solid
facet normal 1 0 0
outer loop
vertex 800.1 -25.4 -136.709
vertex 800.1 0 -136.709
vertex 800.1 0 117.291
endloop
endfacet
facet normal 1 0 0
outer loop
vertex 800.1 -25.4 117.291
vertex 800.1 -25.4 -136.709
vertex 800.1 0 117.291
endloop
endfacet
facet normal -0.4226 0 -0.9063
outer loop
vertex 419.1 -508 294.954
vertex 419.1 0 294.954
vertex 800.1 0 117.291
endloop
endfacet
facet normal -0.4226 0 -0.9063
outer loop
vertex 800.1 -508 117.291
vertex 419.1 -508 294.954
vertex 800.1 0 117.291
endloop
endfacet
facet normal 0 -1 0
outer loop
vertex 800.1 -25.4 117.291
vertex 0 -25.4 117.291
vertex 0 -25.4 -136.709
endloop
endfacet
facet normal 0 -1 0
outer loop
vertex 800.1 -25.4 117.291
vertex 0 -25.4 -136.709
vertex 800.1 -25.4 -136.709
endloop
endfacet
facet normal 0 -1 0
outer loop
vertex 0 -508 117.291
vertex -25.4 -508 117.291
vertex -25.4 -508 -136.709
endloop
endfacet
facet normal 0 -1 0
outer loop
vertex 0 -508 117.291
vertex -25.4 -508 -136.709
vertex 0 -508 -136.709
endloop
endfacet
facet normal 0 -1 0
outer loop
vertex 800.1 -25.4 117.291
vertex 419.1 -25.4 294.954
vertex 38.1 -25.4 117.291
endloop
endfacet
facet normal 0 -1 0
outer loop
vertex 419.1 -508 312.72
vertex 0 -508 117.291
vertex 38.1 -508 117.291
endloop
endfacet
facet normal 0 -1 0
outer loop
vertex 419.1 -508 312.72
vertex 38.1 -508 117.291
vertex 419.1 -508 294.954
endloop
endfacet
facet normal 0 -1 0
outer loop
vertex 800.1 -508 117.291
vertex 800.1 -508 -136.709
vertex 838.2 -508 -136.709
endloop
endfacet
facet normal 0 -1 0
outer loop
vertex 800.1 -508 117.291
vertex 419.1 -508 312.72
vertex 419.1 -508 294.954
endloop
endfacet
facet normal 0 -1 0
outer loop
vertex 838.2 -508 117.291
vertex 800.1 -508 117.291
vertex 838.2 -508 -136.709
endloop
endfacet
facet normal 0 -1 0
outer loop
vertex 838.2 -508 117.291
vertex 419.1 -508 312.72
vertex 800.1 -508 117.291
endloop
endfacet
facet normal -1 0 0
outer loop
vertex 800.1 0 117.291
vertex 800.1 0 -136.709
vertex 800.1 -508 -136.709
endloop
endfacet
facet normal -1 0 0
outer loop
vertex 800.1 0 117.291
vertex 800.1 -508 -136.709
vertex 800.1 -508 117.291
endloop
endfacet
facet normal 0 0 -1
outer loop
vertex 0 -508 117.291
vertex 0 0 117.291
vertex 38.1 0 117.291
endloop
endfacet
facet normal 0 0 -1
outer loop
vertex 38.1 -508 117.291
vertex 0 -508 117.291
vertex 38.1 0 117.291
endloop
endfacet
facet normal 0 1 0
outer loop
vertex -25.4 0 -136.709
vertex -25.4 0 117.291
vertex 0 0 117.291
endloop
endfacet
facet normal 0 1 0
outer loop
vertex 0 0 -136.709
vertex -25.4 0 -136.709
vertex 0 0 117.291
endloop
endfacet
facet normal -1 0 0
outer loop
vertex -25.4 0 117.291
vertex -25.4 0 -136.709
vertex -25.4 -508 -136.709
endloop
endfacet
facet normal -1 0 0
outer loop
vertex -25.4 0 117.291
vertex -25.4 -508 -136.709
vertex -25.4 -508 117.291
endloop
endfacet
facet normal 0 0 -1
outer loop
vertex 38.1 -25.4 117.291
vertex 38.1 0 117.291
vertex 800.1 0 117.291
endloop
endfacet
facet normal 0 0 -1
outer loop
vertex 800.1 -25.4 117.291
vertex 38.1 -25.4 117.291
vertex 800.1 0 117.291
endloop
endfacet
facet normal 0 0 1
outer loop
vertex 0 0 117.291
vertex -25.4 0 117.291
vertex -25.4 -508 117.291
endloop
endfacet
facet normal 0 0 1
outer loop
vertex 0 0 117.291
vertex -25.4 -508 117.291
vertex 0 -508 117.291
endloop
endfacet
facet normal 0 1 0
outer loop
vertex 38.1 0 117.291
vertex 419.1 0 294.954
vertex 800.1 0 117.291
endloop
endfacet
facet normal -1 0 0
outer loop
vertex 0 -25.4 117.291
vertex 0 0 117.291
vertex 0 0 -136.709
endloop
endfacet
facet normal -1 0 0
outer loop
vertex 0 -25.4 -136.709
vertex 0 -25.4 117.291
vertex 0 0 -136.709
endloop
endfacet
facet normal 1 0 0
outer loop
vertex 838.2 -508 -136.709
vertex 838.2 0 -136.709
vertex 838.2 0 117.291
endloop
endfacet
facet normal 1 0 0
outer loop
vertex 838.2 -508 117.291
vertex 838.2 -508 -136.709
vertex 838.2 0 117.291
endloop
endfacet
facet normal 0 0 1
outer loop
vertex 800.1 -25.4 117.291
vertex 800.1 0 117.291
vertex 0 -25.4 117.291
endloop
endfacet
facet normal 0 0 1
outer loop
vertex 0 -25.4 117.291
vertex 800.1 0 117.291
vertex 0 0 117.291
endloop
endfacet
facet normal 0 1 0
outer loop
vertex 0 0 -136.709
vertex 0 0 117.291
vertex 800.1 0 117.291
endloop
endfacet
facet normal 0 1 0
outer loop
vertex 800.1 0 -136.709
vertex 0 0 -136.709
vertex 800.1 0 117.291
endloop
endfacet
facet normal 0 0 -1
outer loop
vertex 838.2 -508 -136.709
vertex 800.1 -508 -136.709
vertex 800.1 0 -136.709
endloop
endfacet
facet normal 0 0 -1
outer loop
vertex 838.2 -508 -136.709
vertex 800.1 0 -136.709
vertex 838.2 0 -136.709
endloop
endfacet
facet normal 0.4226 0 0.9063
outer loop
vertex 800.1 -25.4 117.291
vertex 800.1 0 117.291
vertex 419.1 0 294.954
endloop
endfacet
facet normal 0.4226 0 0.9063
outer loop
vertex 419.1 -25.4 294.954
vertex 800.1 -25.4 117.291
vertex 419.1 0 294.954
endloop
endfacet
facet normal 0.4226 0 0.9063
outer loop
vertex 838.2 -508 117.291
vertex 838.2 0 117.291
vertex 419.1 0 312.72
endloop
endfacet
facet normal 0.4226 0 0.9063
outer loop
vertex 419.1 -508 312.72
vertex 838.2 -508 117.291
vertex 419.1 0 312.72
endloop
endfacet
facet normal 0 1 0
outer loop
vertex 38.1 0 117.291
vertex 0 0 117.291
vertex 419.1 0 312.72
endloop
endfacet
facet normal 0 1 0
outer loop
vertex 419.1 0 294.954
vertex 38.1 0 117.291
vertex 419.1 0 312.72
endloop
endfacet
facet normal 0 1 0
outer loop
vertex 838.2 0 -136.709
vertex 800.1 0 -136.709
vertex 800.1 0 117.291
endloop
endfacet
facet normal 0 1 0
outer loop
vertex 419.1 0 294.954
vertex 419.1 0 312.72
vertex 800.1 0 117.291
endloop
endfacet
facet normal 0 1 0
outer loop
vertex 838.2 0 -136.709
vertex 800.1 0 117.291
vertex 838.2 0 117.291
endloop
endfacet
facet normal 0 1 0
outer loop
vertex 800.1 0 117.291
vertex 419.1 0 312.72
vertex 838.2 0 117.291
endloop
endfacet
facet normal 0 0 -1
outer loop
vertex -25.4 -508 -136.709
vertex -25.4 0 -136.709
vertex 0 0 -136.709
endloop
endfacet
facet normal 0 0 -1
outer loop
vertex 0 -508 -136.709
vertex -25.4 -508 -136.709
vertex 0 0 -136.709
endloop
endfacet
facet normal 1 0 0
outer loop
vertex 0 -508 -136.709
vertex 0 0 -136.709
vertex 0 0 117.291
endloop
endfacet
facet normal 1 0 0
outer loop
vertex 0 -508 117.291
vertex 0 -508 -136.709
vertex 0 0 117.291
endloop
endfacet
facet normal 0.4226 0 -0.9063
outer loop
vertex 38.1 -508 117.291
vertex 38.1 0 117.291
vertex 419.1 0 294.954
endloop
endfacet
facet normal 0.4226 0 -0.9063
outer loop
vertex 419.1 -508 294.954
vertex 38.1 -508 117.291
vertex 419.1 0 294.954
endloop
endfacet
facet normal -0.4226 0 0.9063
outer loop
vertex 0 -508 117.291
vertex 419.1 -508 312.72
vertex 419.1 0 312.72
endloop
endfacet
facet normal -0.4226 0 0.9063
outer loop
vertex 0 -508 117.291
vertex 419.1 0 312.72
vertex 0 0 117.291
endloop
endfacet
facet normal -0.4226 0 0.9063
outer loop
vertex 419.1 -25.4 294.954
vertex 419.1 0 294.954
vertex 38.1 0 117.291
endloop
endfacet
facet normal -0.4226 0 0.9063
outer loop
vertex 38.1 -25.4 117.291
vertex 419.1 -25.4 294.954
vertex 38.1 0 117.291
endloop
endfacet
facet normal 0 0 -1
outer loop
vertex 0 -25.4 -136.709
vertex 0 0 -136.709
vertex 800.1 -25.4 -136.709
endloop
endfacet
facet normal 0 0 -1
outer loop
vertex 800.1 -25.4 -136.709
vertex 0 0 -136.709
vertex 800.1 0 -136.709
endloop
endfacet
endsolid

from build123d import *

# Parameters (mm, degrees)
F0_W     = 25.4
F0_H     = 254
F1_DEPTH = 508
F0_W_2   = 38.1
F2_DEPTH = 508
F3_DEPTH = 508
F4_DEPTH = 25.4
F5_DEPTH = 25.4


with BuildPart() as f1:
    # F0 (on Front) → F1 (new body)
    with BuildSketch(Plane.XZ):
        with Locations((-12.7, -9.709484)):
            Rectangle(F0_W, F0_H)
    extrude(amount=F1_DEPTH)



with BuildPart() as f2:
    # F0 (on Front) → F2 (new body)
    with BuildSketch(Plane.XZ):
        with Locations((819.15, -9.709484)):
            Rectangle(F0_W_2, F0_H)
    extrude(amount=F2_DEPTH)


with BuildPart() as f1_1:
    add(f1.part)

    add(f2.part)  # F3 merges F2
    # F0 (on Front) → F3 (join)
    with BuildSketch(Plane.XZ):
        Polygon((419.1, 312.720056), (0, 117.290516), (38.1, 117.290516), (419.1, 294.953734), (800.1, 117.290516), (838.2, 117.290516), align=None)
    extrude(amount=F3_DEPTH)


with BuildPart() as f4:
    # F0 (on Front) → F4 (new body)
    with BuildSketch(Plane.XZ):
        Polygon((38.1, 117.290516), (0, 117.290516), (0, -136.709484), (76.2, -136.709484), (800.1, -136.709484), (800.1, 117.290516), align=None)
    extrude(amount=F4_DEPTH)


with BuildPart() as f5:
    # F0 (on Front) → F5 (new body)
    with BuildSketch(Plane.XZ):
        Polygon((419.1, 294.953734), (38.1, 117.290516), (800.1, 117.290516), align=None)
    extrude(amount=F5_DEPTH)


solid = Compound([f1_1.part, f4.part, f5.part])
